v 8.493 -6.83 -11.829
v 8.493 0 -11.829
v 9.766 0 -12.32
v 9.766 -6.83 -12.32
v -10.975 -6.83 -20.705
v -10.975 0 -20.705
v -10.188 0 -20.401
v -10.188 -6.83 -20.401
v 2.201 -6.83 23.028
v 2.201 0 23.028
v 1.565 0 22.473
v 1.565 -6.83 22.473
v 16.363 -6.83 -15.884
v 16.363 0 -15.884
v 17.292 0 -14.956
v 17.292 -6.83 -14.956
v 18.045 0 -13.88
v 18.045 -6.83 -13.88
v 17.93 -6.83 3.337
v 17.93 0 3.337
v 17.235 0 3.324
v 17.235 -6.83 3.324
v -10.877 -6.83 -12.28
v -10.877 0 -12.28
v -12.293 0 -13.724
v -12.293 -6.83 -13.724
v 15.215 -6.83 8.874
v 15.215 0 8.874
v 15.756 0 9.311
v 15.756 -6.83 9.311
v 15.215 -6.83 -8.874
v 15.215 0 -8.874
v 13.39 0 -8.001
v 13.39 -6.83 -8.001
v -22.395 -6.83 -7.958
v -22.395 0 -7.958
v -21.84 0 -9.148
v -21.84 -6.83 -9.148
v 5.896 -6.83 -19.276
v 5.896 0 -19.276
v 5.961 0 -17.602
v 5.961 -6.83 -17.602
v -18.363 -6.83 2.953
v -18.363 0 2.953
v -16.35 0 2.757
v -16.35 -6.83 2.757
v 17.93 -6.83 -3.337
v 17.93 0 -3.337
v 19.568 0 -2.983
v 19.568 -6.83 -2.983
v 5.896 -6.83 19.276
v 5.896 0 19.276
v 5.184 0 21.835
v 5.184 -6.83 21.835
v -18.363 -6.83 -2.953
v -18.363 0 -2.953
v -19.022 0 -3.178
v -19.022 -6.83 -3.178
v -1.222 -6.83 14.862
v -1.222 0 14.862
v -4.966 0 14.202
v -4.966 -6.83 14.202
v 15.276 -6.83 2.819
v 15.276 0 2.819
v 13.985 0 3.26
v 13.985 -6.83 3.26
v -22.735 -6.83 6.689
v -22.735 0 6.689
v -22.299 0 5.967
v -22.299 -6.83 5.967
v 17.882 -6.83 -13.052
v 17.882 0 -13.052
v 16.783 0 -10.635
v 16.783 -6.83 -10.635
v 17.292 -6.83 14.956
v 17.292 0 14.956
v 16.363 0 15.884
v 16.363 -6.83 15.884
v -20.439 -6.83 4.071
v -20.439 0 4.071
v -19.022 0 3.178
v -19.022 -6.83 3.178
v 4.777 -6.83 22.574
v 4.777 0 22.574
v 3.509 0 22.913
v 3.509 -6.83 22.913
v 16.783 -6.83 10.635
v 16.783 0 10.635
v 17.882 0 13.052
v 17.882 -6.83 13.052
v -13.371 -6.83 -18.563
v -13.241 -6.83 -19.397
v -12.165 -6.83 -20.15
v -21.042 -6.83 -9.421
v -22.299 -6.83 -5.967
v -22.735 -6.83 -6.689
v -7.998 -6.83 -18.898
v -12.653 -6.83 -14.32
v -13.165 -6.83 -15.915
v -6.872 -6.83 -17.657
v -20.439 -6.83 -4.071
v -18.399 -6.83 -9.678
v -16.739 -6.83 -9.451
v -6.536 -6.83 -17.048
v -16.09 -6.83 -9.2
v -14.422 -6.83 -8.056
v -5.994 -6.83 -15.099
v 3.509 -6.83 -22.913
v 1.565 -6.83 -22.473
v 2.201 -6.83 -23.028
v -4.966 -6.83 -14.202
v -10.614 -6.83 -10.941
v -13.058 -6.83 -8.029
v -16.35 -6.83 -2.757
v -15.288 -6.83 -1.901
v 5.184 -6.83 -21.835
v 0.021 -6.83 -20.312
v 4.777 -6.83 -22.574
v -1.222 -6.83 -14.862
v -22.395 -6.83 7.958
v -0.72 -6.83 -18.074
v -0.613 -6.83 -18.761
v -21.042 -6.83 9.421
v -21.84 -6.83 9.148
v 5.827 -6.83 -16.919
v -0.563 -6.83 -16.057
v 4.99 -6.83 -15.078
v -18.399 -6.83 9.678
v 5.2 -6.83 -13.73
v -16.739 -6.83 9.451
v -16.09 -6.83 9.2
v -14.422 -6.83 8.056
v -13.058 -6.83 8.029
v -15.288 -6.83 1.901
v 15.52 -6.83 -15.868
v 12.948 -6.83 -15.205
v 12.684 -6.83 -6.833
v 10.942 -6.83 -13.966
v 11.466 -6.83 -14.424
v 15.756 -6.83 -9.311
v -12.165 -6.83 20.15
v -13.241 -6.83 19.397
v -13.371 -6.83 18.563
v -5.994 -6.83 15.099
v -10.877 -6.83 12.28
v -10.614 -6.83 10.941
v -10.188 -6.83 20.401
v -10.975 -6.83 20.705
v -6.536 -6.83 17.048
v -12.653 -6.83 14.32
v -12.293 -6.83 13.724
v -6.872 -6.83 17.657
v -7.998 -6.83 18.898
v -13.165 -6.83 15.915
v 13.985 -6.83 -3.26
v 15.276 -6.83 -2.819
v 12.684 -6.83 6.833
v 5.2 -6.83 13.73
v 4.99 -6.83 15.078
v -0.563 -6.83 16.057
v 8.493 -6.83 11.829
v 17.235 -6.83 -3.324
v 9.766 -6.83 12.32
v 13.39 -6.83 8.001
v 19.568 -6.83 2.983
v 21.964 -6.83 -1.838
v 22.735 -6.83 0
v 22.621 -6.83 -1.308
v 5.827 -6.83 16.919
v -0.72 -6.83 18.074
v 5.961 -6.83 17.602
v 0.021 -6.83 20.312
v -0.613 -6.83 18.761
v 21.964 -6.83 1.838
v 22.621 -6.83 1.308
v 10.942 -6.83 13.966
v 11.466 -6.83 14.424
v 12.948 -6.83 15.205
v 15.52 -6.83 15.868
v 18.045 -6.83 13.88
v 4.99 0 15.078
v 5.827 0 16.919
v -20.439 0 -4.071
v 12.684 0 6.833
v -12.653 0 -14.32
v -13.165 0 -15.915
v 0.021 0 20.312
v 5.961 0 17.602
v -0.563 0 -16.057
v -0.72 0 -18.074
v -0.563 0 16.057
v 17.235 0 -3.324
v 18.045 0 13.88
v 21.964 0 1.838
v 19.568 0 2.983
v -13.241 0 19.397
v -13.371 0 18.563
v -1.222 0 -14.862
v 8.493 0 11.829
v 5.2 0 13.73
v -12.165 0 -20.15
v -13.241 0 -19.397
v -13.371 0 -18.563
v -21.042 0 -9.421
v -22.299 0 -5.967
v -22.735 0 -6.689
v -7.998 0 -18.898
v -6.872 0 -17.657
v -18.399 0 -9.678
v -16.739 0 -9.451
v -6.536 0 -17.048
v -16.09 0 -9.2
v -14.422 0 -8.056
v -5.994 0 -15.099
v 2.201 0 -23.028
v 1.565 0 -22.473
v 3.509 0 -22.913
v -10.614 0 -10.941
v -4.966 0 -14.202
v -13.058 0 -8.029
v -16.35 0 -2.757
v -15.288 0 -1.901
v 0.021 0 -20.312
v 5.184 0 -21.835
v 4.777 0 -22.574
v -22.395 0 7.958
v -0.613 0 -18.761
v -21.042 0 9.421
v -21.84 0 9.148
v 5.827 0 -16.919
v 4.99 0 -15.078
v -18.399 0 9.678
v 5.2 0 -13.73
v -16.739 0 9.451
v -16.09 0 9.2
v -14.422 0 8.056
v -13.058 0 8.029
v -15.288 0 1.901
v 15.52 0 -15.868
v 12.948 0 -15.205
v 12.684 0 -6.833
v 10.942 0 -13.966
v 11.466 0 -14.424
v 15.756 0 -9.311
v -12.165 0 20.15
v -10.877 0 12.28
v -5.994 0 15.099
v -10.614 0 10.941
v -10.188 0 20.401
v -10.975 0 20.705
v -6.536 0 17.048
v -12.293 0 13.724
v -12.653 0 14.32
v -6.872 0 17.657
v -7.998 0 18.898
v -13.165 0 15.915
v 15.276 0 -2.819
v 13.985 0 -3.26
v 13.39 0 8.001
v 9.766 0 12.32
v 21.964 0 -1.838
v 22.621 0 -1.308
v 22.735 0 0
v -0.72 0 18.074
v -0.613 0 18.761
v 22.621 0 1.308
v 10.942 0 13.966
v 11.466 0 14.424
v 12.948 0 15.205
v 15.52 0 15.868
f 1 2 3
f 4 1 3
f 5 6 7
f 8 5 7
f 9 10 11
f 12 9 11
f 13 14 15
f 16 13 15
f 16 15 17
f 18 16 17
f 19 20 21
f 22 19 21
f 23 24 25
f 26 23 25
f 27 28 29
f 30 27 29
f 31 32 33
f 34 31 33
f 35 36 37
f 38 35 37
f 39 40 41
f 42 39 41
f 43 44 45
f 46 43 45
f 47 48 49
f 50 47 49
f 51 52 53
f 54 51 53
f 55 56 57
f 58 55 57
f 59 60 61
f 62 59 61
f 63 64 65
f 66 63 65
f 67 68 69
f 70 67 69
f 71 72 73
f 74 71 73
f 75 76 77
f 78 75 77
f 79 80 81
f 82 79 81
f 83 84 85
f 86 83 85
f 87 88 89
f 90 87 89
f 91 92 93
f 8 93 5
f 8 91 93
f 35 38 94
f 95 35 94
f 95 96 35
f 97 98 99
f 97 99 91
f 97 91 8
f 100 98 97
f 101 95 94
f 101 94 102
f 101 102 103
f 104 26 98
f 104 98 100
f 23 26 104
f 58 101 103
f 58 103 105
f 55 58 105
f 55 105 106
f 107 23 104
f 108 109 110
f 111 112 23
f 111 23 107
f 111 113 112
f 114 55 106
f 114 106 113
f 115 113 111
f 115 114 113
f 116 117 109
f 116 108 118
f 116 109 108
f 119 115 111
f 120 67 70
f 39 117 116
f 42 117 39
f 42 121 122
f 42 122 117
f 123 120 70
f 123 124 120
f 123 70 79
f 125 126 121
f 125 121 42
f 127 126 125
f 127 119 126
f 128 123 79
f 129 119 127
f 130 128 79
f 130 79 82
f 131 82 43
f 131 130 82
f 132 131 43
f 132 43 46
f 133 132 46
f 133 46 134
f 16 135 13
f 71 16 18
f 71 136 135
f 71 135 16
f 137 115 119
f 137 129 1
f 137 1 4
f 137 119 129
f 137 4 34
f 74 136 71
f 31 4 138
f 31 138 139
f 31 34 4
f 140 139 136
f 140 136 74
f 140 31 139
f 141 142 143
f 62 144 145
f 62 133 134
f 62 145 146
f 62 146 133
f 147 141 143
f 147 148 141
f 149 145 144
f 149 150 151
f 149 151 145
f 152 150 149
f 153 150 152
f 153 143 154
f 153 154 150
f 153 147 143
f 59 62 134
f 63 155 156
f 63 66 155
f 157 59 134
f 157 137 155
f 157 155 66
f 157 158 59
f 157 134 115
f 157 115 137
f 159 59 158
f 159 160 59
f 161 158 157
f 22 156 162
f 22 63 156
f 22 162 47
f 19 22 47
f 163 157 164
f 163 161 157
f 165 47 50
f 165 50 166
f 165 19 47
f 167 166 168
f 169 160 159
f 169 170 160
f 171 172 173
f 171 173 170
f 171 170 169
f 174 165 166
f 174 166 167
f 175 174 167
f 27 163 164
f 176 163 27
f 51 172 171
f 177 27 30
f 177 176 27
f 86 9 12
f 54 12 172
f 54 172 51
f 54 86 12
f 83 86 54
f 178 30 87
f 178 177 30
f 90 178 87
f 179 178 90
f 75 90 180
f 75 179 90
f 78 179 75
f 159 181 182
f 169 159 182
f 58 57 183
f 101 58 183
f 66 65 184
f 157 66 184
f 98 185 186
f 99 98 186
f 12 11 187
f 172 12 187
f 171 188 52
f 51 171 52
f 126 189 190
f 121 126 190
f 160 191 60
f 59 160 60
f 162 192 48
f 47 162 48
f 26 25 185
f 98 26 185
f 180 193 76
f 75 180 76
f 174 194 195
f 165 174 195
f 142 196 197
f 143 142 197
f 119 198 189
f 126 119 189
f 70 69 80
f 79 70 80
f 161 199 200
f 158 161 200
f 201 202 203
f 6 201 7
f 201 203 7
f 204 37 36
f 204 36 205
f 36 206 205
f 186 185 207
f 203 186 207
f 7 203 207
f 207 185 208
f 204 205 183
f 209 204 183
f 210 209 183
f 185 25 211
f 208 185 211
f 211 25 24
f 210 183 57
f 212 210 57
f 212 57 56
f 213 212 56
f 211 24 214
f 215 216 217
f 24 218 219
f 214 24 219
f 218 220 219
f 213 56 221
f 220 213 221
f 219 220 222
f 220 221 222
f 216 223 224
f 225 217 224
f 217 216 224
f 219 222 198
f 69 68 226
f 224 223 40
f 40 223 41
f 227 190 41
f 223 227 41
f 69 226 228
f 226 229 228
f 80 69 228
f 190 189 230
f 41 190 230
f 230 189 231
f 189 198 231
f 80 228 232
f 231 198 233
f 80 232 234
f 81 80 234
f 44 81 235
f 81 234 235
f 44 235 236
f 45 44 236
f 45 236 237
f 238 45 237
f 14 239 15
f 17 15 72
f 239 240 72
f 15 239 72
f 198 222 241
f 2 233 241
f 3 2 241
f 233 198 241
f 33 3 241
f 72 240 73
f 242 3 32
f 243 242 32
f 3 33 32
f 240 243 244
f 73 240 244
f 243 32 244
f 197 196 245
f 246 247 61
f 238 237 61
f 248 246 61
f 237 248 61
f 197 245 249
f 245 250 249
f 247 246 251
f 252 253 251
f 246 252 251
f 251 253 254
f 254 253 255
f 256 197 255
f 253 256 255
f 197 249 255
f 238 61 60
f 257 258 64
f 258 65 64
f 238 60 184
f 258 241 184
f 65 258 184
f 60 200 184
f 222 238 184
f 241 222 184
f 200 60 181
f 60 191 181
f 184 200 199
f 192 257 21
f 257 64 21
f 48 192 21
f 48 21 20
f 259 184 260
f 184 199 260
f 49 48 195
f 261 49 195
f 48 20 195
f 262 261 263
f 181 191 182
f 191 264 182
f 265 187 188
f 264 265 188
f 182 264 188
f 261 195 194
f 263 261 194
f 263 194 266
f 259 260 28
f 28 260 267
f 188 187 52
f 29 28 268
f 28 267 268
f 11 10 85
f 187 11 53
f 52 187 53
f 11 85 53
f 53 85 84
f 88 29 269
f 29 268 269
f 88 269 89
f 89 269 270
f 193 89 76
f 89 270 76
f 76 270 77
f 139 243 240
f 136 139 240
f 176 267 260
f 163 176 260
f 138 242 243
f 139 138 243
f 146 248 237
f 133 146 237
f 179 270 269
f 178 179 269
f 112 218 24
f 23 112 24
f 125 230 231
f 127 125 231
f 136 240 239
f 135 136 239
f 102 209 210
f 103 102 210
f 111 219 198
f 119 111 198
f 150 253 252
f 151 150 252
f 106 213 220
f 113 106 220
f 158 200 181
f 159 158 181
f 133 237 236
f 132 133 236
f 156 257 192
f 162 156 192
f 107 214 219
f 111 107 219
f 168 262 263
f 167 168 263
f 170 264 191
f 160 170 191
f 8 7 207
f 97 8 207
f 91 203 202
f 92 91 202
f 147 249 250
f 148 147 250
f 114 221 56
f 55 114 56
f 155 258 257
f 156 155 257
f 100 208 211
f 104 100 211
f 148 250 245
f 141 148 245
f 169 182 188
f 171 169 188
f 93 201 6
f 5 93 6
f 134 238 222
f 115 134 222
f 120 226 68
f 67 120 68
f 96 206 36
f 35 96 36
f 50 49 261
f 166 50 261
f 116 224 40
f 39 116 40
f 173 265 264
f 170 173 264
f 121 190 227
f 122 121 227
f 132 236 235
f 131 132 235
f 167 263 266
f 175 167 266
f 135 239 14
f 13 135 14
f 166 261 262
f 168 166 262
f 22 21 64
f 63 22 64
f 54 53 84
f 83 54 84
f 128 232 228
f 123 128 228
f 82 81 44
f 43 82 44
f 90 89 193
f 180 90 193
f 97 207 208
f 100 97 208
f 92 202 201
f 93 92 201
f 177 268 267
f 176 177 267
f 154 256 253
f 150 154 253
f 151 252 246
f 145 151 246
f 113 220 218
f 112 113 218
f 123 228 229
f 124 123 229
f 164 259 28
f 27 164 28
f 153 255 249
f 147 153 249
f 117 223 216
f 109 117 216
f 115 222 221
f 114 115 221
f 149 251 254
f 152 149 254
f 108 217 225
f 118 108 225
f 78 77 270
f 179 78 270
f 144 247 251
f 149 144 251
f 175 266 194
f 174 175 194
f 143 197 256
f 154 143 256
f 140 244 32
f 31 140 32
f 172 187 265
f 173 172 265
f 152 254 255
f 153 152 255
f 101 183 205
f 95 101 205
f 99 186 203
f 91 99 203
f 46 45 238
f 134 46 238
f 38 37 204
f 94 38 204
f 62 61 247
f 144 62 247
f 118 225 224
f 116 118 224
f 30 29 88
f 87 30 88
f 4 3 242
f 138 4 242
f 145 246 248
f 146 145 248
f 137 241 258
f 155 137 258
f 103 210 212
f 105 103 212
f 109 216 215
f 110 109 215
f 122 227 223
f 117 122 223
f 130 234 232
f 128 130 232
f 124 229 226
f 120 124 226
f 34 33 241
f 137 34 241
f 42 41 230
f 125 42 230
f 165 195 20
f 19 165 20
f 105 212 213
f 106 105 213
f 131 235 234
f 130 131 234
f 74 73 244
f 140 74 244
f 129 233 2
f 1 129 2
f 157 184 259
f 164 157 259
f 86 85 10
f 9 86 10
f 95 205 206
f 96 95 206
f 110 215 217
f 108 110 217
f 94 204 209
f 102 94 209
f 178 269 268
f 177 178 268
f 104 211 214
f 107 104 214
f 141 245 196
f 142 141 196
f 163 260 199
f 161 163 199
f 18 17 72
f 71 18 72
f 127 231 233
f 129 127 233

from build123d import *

# Parameters (mm, degrees)
F1_DEPTH = 6.83


with BuildPart() as f1:
    # F0 (on Front) → F1 (new body)
    with BuildSketch(Plane.XZ):
        Polygon((15.519771, -15.867663), (16.363313, -15.884129), (17.291792, -14.95565), (18.044936, -13.880049), (17.882241, -13.052181), (16.783051, -10.634822), (15.756368, -9.310512), (15.214718, -8.873741), (13.389754, -8.001385), (12.684403, -6.833367), (13.984836, -3.260458), (15.275953, -2.819095), (17.234696, -3.323895), (17.930376, -3.337475), (19.568111, -2.982934), (21.963987, -1.837675), (22.620762, -1.30807), (22.735203, 0), (22.620762, 1.30807), (21.963987, 1.837675), (19.568111, 2.982934), (17.930376, 3.337475), (17.234696, 3.323895), (15.275953, 2.819095), (13.984836, 3.260458), (12.684403, 6.833367), (13.389754, 8.001385), (15.214718, 8.873741), (15.756368, 9.310512), (16.783051, 10.634822), (17.882241, 13.052181), (18.044936, 13.880049), (17.291792, 14.95565), (16.363313, 15.884129), (15.519771, 15.867663), (12.948265, 15.204942), (11.465793, 14.423821), (10.9416, 13.966244), (9.765596, 12.320488), (8.49284, 11.828678), (5.200029, 13.729783), (4.989571, 15.077928), (5.826835, 16.919255), (5.961012, 17.602008), (5.896247, 19.276427), (5.184426, 21.834777), (4.776915, 22.573538), (3.50859, 22.913385), (2.20052, 23.027827), (1.564913, 22.472995), (0.021014, 20.312389), (-0.612531, 18.761101), (-0.719961, 18.073632), (-0.562961, 16.056989), (-1.221819, 14.862128), (-4.966266, 14.201881), (-5.994056, 15.09934), (-6.536257, 17.048062), (-6.872337, 17.657328), (-7.998246, 18.898377), (-10.188008, 20.400638), (-10.975046, 20.704619), (-12.165089, 20.149693), (-13.24069, 19.396549), (-13.370954, 18.562963), (-13.164839, 15.915443), (-12.653013, 14.319853), (-12.293413, 13.724166), (-10.876871, 12.280246), (-10.613544, 10.941424), (-13.057558, 8.028761), (-14.421767, 8.055604), (-16.089731, 9.199891), (-16.738811, 9.450588), (-18.399039, 9.677567), (-21.042128, 9.420813), (-21.84043, 9.147778), (-22.395356, 7.957735), (-22.735202, 6.68941), (-22.299172, 5.967114), (-20.439486, 4.071485), (-19.021779, 3.178187), (-18.363409, 2.953011), (-16.350141, 2.757439), (-15.287842, 1.901105), (-15.287842, -1.901105), (-16.350141, -2.757439), (-18.363409, -2.953011), (-19.021779, -3.178187), (-20.439486, -4.071485), (-22.299172, -5.967114), (-22.735202, -6.68941), (-22.395356, -7.957735), (-21.84043, -9.147778), (-21.042128, -9.420813), (-18.399039, -9.677567), (-16.738811, -9.450588), (-16.089731, -9.199891), (-14.421767, -8.055604), (-13.057558, -8.028761), (-10.613544, -10.941424), (-10.876871, -12.280246), (-12.293413, -13.724166), (-12.653013, -14.319853), (-13.164839, -15.915443), (-13.370954, -18.562963), (-13.24069, -19.396549), (-12.165089, -20.149693), (-10.975046, -20.704619), (-10.188008, -20.400638), (-7.998246, -18.898377), (-6.872337, -17.657328), (-6.536257, -17.048062), (-5.994056, -15.09934), (-4.966266, -14.201881), (-1.221819, -14.862128), (-0.562961, -16.056989), (-0.719961, -18.073632), (-0.612531, -18.761101), (0.021014, -20.312389), (1.564913, -22.472995), (2.20052, -23.027827), (3.50859, -22.913385), (4.776915, -22.573538), (5.184426, -21.834777), (5.896247, -19.276427), (5.961012, -17.602008), (5.826835, -16.919255), (4.989571, -15.077928), (5.200029, -13.729783), (8.49284, -11.828678), (9.765596, -12.320488), (10.9416, -13.966244), (11.465793, -14.423821), (12.948265, -15.204942), align=None)
    extrude(amount=F1_DEPTH)


solid = f1.part
